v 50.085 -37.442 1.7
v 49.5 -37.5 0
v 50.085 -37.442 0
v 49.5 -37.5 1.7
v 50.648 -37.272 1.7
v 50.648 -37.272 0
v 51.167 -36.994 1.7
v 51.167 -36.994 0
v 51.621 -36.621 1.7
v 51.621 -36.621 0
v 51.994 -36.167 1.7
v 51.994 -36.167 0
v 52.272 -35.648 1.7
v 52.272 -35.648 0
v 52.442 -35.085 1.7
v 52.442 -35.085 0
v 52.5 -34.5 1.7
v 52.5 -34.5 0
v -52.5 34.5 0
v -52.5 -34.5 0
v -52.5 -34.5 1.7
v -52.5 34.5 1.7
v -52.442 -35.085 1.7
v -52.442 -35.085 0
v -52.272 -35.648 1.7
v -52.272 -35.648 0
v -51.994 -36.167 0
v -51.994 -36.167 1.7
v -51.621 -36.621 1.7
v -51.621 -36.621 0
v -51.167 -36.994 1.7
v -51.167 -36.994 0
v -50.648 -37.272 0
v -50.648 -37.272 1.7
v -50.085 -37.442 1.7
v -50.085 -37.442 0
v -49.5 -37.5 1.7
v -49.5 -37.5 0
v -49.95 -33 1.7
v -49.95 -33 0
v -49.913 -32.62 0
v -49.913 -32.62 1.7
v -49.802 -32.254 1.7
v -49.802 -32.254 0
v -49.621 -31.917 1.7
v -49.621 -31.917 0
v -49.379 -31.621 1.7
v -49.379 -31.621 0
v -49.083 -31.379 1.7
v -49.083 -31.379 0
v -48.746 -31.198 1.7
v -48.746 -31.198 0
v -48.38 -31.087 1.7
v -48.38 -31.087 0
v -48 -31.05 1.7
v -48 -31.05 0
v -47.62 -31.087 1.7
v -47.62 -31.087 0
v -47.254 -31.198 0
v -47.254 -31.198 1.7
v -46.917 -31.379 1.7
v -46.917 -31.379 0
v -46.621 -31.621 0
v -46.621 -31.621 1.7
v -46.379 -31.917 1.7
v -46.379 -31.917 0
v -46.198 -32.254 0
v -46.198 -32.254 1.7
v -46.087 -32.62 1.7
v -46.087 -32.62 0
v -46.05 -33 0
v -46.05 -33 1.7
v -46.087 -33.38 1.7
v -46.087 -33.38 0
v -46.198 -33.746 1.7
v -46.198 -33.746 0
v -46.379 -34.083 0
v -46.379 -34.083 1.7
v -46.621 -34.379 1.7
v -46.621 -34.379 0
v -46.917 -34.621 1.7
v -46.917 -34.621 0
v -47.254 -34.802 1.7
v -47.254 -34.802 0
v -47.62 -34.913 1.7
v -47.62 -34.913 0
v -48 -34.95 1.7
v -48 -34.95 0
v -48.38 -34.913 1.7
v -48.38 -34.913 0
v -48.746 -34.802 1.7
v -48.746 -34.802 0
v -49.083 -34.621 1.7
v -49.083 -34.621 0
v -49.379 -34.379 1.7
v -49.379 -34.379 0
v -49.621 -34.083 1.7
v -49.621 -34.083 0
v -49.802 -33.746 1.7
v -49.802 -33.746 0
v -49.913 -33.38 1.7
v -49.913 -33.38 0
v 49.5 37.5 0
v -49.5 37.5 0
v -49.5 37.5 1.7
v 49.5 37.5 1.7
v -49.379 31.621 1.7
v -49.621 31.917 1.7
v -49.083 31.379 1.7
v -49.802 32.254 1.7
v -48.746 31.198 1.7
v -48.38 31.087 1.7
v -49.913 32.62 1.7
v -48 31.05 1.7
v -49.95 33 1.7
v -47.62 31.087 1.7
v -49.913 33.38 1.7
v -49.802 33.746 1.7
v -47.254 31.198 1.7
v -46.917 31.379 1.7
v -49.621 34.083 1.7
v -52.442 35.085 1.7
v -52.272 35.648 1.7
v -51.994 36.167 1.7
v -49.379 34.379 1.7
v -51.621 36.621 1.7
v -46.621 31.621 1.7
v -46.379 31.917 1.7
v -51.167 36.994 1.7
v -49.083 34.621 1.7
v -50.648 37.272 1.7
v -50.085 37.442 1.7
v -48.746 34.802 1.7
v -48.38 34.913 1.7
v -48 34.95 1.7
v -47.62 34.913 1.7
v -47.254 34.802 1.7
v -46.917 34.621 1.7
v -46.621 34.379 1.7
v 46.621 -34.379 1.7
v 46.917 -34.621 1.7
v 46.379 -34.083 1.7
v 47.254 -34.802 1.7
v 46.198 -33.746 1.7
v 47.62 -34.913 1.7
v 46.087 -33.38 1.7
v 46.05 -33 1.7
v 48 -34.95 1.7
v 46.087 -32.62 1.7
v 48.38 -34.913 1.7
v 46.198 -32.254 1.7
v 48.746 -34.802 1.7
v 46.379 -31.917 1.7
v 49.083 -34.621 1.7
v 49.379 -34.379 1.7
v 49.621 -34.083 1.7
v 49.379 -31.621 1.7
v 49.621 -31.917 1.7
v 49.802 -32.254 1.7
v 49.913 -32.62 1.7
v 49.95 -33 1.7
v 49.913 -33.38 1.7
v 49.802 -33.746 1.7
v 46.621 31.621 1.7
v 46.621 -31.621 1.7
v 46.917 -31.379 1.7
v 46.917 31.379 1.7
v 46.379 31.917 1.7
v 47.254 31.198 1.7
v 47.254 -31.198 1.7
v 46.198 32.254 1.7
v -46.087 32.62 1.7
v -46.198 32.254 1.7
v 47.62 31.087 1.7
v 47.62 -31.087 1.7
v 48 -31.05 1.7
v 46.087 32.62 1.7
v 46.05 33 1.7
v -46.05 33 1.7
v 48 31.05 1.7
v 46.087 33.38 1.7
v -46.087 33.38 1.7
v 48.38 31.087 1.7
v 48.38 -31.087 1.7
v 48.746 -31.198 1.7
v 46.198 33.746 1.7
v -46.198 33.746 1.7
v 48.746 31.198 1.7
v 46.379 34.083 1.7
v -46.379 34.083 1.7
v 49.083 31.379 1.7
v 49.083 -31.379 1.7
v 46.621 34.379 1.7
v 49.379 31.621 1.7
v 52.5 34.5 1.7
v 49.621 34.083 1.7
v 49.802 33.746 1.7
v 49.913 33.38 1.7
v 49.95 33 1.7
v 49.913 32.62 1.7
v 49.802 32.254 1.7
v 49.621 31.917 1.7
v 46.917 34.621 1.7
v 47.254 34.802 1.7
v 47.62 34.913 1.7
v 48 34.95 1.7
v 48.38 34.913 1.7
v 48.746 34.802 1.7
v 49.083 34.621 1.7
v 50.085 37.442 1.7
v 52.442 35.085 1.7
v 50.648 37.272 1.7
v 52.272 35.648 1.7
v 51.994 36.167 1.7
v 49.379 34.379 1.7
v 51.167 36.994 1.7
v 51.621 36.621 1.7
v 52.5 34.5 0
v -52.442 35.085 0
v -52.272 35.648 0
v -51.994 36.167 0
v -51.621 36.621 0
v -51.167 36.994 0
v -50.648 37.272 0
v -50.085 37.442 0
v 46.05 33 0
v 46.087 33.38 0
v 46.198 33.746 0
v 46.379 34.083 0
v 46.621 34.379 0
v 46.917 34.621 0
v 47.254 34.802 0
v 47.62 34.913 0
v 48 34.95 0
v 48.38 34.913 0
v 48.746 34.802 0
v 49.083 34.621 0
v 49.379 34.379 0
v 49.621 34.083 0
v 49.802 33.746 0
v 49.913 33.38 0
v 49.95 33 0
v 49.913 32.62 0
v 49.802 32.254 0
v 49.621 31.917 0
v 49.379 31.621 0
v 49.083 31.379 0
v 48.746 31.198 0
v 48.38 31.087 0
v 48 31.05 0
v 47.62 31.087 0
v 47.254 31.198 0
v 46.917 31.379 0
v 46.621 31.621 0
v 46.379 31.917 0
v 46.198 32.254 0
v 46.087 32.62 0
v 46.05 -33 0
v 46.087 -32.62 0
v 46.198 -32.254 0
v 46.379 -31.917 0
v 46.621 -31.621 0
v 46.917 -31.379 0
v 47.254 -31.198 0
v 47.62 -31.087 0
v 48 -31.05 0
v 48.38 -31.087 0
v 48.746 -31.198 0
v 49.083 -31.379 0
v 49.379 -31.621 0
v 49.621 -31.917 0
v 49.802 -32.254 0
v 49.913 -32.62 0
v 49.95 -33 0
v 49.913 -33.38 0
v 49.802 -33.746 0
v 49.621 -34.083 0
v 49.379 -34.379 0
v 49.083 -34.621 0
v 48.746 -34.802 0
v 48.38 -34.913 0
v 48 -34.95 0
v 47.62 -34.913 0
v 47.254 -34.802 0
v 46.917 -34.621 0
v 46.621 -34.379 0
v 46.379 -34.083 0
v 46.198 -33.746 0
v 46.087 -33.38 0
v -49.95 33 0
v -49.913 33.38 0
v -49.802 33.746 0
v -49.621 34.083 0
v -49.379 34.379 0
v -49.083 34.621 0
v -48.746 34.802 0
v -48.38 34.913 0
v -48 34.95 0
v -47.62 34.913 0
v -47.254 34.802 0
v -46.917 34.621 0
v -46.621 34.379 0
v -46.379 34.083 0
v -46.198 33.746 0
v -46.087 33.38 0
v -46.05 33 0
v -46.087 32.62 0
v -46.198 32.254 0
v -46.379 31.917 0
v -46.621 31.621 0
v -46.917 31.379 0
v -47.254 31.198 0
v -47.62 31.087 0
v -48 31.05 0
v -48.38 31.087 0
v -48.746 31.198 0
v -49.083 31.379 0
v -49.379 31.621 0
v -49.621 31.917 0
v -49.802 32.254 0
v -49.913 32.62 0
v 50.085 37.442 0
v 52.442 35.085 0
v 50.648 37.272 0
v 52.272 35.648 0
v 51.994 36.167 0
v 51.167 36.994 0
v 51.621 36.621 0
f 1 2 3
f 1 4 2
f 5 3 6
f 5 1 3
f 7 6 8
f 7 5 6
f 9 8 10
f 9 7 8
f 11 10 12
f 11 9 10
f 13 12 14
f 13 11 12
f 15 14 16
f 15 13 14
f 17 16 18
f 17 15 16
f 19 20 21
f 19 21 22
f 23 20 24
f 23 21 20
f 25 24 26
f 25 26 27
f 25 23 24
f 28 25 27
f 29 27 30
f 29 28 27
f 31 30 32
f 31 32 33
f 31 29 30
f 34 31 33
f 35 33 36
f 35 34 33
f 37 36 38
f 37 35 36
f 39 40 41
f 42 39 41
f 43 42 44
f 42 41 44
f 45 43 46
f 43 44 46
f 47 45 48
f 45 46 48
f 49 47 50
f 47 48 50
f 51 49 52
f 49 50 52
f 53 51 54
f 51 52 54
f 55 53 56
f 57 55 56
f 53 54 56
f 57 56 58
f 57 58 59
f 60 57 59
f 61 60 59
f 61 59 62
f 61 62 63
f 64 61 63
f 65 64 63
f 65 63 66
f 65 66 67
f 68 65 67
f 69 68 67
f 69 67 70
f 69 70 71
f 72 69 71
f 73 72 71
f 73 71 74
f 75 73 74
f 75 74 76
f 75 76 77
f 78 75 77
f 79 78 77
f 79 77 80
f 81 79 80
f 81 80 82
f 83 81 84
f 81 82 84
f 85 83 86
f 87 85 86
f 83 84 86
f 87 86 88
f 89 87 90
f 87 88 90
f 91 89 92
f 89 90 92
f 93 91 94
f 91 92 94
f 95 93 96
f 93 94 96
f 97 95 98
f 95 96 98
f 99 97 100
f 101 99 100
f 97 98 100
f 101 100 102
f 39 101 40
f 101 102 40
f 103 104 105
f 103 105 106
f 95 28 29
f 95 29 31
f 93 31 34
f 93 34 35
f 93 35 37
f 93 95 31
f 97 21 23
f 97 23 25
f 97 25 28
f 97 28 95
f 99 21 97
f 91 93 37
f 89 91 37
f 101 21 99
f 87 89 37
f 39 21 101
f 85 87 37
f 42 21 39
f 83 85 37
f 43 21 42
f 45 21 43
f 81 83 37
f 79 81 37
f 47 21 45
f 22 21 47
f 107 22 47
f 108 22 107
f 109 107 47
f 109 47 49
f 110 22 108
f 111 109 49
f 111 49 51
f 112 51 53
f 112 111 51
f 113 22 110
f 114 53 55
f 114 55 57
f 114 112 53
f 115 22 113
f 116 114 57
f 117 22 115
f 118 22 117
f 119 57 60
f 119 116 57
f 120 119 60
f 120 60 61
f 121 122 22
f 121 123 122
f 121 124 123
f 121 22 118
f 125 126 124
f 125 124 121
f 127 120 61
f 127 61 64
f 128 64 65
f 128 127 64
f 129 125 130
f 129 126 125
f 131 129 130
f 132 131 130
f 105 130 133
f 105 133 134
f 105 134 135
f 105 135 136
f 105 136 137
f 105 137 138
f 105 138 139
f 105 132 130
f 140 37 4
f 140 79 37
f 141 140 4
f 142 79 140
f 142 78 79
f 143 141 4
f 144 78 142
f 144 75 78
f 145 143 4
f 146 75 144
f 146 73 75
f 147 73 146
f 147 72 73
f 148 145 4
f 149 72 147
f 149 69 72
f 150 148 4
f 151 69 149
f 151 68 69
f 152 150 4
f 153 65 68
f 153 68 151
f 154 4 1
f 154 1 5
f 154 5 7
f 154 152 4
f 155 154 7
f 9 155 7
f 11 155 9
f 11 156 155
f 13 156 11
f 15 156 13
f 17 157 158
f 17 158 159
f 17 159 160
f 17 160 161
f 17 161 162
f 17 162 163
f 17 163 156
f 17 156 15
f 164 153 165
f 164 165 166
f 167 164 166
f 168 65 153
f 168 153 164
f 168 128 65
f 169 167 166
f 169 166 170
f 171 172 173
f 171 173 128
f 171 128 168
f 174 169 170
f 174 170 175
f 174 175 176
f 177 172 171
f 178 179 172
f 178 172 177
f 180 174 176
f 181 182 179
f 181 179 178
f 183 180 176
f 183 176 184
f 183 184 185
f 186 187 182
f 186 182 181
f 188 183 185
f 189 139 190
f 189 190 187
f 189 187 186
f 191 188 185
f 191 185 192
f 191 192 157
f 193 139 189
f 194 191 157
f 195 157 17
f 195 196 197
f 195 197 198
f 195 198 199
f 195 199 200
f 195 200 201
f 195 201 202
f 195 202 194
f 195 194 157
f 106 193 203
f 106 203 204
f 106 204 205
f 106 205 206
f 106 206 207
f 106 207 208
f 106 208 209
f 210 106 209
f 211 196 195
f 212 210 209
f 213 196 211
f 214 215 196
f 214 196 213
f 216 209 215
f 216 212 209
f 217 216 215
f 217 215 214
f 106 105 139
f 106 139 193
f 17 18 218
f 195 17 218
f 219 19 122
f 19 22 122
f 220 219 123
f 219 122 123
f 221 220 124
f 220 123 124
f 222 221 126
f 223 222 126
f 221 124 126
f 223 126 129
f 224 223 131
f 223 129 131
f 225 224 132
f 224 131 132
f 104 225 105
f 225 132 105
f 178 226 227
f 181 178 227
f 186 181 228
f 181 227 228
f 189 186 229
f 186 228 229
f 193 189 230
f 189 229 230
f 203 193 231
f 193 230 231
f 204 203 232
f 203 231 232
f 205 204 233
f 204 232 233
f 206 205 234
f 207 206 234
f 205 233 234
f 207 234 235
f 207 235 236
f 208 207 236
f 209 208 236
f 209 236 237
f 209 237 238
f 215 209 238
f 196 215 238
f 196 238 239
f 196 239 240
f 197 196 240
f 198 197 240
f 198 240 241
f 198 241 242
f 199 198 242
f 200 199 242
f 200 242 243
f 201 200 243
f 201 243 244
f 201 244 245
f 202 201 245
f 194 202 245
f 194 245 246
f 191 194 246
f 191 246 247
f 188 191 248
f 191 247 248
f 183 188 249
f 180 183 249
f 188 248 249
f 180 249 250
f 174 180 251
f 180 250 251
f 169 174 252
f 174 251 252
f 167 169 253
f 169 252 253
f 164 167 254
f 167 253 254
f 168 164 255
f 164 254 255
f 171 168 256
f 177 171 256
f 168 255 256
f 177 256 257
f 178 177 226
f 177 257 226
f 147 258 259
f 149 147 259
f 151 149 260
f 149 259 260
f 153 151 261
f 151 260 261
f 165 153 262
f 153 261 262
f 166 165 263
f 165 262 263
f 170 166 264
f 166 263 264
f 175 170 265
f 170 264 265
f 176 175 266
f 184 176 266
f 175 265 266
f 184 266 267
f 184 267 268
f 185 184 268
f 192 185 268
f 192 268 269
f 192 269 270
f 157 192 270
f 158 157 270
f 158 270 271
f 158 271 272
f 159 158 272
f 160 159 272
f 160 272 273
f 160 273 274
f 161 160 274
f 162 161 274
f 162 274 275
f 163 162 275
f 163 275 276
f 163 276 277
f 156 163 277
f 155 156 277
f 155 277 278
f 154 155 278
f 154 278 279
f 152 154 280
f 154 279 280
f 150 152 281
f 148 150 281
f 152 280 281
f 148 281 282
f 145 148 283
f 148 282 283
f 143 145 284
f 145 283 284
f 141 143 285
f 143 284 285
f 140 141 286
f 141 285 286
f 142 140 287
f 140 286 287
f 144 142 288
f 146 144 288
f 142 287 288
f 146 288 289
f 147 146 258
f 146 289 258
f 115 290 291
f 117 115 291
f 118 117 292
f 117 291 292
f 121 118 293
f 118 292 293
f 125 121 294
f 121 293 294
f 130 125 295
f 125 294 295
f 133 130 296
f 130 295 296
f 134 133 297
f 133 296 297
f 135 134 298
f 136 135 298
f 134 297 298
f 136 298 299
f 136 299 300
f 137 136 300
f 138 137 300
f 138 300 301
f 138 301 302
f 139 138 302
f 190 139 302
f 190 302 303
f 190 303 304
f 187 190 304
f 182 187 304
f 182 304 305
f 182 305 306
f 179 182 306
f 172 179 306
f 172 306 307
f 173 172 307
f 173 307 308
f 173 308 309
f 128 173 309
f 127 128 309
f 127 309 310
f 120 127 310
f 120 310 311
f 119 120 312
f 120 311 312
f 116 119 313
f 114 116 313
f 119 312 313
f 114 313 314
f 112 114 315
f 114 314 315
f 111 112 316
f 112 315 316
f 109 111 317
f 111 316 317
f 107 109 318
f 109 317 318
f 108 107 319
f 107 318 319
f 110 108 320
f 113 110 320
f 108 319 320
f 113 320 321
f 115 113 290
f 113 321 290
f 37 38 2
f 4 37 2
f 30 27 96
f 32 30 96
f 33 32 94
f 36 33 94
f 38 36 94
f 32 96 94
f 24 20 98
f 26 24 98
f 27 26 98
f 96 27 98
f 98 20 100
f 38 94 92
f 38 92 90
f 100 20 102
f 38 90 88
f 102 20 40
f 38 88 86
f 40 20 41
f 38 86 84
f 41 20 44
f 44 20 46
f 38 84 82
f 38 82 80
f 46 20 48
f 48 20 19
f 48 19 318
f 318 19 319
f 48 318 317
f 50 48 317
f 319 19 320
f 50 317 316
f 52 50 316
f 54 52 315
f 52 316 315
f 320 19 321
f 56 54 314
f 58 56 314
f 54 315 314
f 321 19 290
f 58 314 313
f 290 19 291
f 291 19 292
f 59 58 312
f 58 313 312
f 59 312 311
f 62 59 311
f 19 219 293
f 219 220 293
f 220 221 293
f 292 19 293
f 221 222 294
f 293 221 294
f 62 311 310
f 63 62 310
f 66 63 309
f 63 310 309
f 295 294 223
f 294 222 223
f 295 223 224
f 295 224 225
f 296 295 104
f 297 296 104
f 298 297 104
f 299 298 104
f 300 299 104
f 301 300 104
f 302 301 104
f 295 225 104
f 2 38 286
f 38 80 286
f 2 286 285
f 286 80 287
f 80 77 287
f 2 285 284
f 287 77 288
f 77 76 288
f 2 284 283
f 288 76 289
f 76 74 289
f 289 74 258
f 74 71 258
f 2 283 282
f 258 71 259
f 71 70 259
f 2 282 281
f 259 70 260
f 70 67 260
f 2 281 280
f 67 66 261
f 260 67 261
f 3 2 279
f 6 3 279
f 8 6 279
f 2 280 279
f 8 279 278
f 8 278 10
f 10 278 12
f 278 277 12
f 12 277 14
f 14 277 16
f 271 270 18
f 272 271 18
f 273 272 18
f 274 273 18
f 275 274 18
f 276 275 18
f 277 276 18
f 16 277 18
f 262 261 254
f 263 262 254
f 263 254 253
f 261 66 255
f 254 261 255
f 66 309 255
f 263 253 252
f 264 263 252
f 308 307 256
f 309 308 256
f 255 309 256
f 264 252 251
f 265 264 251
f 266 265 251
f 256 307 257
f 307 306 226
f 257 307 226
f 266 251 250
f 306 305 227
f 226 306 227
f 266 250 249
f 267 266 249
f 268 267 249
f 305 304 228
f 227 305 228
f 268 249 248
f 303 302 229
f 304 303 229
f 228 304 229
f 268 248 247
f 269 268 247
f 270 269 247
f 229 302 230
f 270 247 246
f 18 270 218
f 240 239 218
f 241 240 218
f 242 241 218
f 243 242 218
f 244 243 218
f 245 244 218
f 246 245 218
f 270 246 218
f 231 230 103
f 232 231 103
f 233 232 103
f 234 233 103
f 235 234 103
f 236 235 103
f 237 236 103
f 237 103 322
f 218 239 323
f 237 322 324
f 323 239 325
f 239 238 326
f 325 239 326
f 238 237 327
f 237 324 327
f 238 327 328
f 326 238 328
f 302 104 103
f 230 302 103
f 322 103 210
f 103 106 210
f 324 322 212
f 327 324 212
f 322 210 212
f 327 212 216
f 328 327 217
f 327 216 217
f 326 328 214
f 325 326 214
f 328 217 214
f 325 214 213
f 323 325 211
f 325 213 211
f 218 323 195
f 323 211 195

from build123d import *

# Parameters (mm, degrees)
ESQUISSE1_W                     = 105
ESQUISSE1_H                     = 75
BOSS_EXTRU_1_DEPTH              = 1.7
D_GAGEMENT_M3_51_D              = 3.9
R_P_TITION_LIN_AIRE1_COUNT      = 2
R_P_TITION_LIN_AIRE1_PITCH      = 96
R_P_TITION_LIN_AIRE1_COUNT_DIR2 = 2
R_P_TITION_LIN_AIRE1_PITCH_DIR2 = 66
CONG_1_R                        = 3


with BuildPart() as part:
    # Esquisse1 → Boss.-Extru.1 (new body)
    with BuildSketch(Plane.XY):
        Rectangle(ESQUISSE1_W, ESQUISSE1_H)
    extrude(amount=BOSS_EXTRU_1_DEPTH)

    # Dégagement M3.51 (through all)
    with Locations(Plane.XY.offset(1.7)):
        with Locations((48, 33)):
            d_gagement_m3_51 = Hole(D_GAGEMENT_M3_51_D / 2)

    # Répétition linéaire1: D_gagement M3.51 2 × 2
    with Locations(*[(-i * R_P_TITION_LIN_AIRE1_PITCH, -j * R_P_TITION_LIN_AIRE1_PITCH_DIR2, 0) for i in range(R_P_TITION_LIN_AIRE1_COUNT) for j in range(R_P_TITION_LIN_AIRE1_COUNT_DIR2) if (i, j) != (0, 0)]):
        add(d_gagement_m3_51, mode=Mode.SUBTRACT)

    # Congé1
    cong_1_edges = [part.edges().sort_by_distance(p)[0] for p in [
        (52.5, -37.5, 0.85),
        (52.5, 37.5, 0.85),
        (-52.5, 37.5, 0.85),
        (-52.5, -37.5, 0.85),
    ]]
    fillet(cong_1_edges, radius=CONG_1_R)


solid = part.part
